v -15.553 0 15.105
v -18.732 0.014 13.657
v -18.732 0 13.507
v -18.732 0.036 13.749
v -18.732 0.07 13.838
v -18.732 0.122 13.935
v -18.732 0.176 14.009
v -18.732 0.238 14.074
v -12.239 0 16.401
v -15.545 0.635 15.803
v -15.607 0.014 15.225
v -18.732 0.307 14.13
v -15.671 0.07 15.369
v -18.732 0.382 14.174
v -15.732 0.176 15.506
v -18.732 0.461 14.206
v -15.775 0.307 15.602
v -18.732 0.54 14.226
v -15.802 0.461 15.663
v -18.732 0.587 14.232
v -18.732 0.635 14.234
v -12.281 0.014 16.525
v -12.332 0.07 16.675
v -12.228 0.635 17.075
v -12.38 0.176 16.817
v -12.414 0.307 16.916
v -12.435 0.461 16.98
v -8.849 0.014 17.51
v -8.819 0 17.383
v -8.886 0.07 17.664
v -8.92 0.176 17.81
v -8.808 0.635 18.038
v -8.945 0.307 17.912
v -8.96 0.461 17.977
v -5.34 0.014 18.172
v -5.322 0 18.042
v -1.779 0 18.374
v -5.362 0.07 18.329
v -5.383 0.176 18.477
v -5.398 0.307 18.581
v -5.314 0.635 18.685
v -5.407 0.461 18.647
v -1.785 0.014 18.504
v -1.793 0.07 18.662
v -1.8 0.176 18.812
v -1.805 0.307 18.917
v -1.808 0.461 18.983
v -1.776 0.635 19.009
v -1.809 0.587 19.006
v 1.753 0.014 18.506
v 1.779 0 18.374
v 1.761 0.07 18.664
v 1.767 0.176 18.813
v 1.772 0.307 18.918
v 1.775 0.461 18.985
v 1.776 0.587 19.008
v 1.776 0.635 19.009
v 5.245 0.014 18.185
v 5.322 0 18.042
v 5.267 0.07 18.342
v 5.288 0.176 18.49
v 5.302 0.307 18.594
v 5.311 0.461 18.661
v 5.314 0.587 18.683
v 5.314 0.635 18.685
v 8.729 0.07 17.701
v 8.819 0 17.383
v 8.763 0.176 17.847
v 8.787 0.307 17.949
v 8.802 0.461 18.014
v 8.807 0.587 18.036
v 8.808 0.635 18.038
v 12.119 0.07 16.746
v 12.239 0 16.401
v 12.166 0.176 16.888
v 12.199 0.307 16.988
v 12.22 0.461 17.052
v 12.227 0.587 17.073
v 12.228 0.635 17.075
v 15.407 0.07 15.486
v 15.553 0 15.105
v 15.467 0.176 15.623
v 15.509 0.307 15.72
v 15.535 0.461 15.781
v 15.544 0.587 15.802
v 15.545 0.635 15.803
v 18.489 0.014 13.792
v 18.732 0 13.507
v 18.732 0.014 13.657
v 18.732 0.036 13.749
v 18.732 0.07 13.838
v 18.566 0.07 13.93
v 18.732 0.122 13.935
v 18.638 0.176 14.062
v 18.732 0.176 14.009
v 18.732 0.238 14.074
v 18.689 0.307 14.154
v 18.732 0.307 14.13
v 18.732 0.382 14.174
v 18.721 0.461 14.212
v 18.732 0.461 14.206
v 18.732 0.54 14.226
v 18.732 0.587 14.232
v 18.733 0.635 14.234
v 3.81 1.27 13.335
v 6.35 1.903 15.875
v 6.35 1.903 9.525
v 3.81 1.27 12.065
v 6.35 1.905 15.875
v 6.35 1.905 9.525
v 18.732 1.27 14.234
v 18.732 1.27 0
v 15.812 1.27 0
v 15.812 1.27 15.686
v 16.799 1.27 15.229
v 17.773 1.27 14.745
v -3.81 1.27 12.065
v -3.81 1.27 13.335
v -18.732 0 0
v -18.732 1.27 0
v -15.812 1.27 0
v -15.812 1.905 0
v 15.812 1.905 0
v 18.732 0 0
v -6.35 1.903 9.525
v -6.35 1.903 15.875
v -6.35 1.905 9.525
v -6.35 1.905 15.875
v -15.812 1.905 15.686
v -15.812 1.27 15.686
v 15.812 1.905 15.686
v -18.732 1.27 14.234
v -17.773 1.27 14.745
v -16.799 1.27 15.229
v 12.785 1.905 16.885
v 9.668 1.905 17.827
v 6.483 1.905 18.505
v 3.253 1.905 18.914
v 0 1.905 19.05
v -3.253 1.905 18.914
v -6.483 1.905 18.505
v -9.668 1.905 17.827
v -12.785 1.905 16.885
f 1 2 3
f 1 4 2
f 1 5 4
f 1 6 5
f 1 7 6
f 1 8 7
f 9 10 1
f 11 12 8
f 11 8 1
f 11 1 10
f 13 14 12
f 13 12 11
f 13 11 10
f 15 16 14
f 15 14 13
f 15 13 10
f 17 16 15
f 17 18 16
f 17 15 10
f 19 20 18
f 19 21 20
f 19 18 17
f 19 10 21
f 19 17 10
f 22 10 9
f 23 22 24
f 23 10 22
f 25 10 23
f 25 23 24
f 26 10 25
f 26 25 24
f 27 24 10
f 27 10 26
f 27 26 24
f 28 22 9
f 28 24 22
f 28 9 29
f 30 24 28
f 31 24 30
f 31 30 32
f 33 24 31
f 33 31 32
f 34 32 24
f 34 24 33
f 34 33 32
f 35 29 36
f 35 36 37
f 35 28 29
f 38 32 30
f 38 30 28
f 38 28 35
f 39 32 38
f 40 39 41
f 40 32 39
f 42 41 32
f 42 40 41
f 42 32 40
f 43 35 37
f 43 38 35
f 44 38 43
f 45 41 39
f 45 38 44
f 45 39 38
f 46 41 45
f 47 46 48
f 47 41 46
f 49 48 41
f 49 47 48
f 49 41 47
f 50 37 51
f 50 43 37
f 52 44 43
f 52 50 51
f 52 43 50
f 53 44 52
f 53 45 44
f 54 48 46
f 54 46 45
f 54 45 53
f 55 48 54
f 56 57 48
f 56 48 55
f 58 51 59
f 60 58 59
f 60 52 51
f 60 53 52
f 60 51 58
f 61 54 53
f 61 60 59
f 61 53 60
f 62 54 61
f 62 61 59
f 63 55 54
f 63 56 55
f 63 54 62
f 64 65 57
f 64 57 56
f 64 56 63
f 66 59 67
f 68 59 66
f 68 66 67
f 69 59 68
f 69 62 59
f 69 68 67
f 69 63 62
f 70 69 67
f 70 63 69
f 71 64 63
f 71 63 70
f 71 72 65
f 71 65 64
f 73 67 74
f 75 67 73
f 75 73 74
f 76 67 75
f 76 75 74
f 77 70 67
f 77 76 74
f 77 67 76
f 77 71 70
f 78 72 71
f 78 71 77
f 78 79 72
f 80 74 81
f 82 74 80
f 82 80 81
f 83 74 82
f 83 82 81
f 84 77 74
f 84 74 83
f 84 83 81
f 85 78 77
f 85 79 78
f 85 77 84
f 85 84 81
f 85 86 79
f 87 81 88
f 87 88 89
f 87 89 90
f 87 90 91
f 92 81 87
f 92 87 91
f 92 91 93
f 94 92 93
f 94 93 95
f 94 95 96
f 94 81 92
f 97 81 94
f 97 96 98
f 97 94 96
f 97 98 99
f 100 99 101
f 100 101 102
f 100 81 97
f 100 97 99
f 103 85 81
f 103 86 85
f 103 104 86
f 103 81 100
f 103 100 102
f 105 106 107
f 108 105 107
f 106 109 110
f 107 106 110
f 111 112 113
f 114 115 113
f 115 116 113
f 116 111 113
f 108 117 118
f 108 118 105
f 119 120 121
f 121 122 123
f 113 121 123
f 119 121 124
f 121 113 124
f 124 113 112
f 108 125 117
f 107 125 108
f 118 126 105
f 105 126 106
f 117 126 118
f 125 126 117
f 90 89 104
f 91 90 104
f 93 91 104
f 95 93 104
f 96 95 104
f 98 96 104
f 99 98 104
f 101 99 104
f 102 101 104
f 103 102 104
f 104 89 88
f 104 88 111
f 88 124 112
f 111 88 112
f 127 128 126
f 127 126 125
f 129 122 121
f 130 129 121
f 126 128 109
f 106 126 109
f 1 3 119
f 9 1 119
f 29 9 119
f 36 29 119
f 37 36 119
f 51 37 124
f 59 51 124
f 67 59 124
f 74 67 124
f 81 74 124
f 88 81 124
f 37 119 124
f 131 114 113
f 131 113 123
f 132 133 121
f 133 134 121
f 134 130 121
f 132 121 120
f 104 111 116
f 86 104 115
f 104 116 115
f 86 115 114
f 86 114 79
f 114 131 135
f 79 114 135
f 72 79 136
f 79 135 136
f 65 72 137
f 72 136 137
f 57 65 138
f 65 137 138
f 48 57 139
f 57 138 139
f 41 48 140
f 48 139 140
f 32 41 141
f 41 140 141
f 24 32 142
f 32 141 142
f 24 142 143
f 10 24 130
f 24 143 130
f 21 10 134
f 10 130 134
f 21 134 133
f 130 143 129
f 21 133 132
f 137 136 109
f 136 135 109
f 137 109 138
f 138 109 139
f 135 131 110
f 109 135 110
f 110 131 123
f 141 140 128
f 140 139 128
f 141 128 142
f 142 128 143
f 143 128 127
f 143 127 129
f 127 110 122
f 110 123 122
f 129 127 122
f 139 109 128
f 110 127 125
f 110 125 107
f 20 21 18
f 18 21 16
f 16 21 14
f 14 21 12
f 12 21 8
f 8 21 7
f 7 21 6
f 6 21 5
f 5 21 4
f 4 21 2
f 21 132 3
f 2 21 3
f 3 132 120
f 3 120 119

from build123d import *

# Parameters (mm, degrees)
BOSS_EXTRUDE1_DEPTH = 19.05
SKETCH2_W           = 12.7
SKETCH2_H           = 6.35
CUT_EXTRUDE1_DEPTH  = 0.635
CHAMFER1_SIZE       = 2.54
CHAMFER1_SIZE2      = 0.633293127
CUT_EXTRUDE2_DEPTH  = 27.785034651
FILLET1_R           = 0.635


with BuildPart() as part:
    # Sketch1 → Boss-Extrude1 (new body)
    with BuildSketch(Plane.XY):
        Polygon((-18.7325, 0), (18.7325, 0), (18.7325, 1.27), (15.8115, 1.27), (15.8115, 1.905), (-15.8115, 1.905), (-15.8115, 1.27), (-18.7325, 1.27), align=None)
    extrude(amount=BOSS_EXTRUDE1_DEPTH)

    # Sketch2 → Cut-Extrude1 (cut)
    with BuildSketch(Plane(origin=(0, 1.905, 0), x_dir=(1, 0, 0), z_dir=(0, 1, 0))):
        with Locations((0, -12.7)):
            Rectangle(SKETCH2_W, SKETCH2_H)
    extrude(amount=-CUT_EXTRUDE1_DEPTH, mode=Mode.SUBTRACT)

    # Chamfer1
    chamfer1_edges = [part.edges().sort_by_distance(p)[0] for p in [
        (6.35, 1.27, 12.7),
        (0, 1.27, 15.875),
        (-6.35, 1.27, 12.7),
        (0, 1.27, 9.525),
    ]]
    chamfer1_side = [part.faces().sort_by_distance(p)[0] for p in [
        (0, 1.27, 12.7),
    ]]
    chamfer(chamfer1_edges, length=CHAMFER1_SIZE, length2=CHAMFER1_SIZE2, reference=chamfer1_side[0])

    # Sketch3 → Cut-Extrude2 (cut, through all)
    with BuildSketch(Plane(origin=(0, 1.905, 0), x_dir=(1, 0, 0), z_dir=(0, 1, 0))):
        with BuildLine():
            Line((-18.7325, -21.59), (18.7325, -21.59))
            Line((18.7325, -21.59), (18.7325, -14.233613746))
            ThreePointArc((18.7325, -14.233613746), (0, -19.05), (-18.7325, -14.233613746))
            Line((-18.7325, -14.233613746), (-18.7325, -21.59))
        make_face()
    extrude(amount=-CUT_EXTRUDE2_DEPTH, mode=Mode.SUBTRACT)

    # Fillet1
    fillet1_edges = [part.edges().sort_by_distance(p)[0] for p in [
        (0, 0, 19.05),
    ]]
    fillet(fillet1_edges, radius=FILLET1_R)


solid = part.part
